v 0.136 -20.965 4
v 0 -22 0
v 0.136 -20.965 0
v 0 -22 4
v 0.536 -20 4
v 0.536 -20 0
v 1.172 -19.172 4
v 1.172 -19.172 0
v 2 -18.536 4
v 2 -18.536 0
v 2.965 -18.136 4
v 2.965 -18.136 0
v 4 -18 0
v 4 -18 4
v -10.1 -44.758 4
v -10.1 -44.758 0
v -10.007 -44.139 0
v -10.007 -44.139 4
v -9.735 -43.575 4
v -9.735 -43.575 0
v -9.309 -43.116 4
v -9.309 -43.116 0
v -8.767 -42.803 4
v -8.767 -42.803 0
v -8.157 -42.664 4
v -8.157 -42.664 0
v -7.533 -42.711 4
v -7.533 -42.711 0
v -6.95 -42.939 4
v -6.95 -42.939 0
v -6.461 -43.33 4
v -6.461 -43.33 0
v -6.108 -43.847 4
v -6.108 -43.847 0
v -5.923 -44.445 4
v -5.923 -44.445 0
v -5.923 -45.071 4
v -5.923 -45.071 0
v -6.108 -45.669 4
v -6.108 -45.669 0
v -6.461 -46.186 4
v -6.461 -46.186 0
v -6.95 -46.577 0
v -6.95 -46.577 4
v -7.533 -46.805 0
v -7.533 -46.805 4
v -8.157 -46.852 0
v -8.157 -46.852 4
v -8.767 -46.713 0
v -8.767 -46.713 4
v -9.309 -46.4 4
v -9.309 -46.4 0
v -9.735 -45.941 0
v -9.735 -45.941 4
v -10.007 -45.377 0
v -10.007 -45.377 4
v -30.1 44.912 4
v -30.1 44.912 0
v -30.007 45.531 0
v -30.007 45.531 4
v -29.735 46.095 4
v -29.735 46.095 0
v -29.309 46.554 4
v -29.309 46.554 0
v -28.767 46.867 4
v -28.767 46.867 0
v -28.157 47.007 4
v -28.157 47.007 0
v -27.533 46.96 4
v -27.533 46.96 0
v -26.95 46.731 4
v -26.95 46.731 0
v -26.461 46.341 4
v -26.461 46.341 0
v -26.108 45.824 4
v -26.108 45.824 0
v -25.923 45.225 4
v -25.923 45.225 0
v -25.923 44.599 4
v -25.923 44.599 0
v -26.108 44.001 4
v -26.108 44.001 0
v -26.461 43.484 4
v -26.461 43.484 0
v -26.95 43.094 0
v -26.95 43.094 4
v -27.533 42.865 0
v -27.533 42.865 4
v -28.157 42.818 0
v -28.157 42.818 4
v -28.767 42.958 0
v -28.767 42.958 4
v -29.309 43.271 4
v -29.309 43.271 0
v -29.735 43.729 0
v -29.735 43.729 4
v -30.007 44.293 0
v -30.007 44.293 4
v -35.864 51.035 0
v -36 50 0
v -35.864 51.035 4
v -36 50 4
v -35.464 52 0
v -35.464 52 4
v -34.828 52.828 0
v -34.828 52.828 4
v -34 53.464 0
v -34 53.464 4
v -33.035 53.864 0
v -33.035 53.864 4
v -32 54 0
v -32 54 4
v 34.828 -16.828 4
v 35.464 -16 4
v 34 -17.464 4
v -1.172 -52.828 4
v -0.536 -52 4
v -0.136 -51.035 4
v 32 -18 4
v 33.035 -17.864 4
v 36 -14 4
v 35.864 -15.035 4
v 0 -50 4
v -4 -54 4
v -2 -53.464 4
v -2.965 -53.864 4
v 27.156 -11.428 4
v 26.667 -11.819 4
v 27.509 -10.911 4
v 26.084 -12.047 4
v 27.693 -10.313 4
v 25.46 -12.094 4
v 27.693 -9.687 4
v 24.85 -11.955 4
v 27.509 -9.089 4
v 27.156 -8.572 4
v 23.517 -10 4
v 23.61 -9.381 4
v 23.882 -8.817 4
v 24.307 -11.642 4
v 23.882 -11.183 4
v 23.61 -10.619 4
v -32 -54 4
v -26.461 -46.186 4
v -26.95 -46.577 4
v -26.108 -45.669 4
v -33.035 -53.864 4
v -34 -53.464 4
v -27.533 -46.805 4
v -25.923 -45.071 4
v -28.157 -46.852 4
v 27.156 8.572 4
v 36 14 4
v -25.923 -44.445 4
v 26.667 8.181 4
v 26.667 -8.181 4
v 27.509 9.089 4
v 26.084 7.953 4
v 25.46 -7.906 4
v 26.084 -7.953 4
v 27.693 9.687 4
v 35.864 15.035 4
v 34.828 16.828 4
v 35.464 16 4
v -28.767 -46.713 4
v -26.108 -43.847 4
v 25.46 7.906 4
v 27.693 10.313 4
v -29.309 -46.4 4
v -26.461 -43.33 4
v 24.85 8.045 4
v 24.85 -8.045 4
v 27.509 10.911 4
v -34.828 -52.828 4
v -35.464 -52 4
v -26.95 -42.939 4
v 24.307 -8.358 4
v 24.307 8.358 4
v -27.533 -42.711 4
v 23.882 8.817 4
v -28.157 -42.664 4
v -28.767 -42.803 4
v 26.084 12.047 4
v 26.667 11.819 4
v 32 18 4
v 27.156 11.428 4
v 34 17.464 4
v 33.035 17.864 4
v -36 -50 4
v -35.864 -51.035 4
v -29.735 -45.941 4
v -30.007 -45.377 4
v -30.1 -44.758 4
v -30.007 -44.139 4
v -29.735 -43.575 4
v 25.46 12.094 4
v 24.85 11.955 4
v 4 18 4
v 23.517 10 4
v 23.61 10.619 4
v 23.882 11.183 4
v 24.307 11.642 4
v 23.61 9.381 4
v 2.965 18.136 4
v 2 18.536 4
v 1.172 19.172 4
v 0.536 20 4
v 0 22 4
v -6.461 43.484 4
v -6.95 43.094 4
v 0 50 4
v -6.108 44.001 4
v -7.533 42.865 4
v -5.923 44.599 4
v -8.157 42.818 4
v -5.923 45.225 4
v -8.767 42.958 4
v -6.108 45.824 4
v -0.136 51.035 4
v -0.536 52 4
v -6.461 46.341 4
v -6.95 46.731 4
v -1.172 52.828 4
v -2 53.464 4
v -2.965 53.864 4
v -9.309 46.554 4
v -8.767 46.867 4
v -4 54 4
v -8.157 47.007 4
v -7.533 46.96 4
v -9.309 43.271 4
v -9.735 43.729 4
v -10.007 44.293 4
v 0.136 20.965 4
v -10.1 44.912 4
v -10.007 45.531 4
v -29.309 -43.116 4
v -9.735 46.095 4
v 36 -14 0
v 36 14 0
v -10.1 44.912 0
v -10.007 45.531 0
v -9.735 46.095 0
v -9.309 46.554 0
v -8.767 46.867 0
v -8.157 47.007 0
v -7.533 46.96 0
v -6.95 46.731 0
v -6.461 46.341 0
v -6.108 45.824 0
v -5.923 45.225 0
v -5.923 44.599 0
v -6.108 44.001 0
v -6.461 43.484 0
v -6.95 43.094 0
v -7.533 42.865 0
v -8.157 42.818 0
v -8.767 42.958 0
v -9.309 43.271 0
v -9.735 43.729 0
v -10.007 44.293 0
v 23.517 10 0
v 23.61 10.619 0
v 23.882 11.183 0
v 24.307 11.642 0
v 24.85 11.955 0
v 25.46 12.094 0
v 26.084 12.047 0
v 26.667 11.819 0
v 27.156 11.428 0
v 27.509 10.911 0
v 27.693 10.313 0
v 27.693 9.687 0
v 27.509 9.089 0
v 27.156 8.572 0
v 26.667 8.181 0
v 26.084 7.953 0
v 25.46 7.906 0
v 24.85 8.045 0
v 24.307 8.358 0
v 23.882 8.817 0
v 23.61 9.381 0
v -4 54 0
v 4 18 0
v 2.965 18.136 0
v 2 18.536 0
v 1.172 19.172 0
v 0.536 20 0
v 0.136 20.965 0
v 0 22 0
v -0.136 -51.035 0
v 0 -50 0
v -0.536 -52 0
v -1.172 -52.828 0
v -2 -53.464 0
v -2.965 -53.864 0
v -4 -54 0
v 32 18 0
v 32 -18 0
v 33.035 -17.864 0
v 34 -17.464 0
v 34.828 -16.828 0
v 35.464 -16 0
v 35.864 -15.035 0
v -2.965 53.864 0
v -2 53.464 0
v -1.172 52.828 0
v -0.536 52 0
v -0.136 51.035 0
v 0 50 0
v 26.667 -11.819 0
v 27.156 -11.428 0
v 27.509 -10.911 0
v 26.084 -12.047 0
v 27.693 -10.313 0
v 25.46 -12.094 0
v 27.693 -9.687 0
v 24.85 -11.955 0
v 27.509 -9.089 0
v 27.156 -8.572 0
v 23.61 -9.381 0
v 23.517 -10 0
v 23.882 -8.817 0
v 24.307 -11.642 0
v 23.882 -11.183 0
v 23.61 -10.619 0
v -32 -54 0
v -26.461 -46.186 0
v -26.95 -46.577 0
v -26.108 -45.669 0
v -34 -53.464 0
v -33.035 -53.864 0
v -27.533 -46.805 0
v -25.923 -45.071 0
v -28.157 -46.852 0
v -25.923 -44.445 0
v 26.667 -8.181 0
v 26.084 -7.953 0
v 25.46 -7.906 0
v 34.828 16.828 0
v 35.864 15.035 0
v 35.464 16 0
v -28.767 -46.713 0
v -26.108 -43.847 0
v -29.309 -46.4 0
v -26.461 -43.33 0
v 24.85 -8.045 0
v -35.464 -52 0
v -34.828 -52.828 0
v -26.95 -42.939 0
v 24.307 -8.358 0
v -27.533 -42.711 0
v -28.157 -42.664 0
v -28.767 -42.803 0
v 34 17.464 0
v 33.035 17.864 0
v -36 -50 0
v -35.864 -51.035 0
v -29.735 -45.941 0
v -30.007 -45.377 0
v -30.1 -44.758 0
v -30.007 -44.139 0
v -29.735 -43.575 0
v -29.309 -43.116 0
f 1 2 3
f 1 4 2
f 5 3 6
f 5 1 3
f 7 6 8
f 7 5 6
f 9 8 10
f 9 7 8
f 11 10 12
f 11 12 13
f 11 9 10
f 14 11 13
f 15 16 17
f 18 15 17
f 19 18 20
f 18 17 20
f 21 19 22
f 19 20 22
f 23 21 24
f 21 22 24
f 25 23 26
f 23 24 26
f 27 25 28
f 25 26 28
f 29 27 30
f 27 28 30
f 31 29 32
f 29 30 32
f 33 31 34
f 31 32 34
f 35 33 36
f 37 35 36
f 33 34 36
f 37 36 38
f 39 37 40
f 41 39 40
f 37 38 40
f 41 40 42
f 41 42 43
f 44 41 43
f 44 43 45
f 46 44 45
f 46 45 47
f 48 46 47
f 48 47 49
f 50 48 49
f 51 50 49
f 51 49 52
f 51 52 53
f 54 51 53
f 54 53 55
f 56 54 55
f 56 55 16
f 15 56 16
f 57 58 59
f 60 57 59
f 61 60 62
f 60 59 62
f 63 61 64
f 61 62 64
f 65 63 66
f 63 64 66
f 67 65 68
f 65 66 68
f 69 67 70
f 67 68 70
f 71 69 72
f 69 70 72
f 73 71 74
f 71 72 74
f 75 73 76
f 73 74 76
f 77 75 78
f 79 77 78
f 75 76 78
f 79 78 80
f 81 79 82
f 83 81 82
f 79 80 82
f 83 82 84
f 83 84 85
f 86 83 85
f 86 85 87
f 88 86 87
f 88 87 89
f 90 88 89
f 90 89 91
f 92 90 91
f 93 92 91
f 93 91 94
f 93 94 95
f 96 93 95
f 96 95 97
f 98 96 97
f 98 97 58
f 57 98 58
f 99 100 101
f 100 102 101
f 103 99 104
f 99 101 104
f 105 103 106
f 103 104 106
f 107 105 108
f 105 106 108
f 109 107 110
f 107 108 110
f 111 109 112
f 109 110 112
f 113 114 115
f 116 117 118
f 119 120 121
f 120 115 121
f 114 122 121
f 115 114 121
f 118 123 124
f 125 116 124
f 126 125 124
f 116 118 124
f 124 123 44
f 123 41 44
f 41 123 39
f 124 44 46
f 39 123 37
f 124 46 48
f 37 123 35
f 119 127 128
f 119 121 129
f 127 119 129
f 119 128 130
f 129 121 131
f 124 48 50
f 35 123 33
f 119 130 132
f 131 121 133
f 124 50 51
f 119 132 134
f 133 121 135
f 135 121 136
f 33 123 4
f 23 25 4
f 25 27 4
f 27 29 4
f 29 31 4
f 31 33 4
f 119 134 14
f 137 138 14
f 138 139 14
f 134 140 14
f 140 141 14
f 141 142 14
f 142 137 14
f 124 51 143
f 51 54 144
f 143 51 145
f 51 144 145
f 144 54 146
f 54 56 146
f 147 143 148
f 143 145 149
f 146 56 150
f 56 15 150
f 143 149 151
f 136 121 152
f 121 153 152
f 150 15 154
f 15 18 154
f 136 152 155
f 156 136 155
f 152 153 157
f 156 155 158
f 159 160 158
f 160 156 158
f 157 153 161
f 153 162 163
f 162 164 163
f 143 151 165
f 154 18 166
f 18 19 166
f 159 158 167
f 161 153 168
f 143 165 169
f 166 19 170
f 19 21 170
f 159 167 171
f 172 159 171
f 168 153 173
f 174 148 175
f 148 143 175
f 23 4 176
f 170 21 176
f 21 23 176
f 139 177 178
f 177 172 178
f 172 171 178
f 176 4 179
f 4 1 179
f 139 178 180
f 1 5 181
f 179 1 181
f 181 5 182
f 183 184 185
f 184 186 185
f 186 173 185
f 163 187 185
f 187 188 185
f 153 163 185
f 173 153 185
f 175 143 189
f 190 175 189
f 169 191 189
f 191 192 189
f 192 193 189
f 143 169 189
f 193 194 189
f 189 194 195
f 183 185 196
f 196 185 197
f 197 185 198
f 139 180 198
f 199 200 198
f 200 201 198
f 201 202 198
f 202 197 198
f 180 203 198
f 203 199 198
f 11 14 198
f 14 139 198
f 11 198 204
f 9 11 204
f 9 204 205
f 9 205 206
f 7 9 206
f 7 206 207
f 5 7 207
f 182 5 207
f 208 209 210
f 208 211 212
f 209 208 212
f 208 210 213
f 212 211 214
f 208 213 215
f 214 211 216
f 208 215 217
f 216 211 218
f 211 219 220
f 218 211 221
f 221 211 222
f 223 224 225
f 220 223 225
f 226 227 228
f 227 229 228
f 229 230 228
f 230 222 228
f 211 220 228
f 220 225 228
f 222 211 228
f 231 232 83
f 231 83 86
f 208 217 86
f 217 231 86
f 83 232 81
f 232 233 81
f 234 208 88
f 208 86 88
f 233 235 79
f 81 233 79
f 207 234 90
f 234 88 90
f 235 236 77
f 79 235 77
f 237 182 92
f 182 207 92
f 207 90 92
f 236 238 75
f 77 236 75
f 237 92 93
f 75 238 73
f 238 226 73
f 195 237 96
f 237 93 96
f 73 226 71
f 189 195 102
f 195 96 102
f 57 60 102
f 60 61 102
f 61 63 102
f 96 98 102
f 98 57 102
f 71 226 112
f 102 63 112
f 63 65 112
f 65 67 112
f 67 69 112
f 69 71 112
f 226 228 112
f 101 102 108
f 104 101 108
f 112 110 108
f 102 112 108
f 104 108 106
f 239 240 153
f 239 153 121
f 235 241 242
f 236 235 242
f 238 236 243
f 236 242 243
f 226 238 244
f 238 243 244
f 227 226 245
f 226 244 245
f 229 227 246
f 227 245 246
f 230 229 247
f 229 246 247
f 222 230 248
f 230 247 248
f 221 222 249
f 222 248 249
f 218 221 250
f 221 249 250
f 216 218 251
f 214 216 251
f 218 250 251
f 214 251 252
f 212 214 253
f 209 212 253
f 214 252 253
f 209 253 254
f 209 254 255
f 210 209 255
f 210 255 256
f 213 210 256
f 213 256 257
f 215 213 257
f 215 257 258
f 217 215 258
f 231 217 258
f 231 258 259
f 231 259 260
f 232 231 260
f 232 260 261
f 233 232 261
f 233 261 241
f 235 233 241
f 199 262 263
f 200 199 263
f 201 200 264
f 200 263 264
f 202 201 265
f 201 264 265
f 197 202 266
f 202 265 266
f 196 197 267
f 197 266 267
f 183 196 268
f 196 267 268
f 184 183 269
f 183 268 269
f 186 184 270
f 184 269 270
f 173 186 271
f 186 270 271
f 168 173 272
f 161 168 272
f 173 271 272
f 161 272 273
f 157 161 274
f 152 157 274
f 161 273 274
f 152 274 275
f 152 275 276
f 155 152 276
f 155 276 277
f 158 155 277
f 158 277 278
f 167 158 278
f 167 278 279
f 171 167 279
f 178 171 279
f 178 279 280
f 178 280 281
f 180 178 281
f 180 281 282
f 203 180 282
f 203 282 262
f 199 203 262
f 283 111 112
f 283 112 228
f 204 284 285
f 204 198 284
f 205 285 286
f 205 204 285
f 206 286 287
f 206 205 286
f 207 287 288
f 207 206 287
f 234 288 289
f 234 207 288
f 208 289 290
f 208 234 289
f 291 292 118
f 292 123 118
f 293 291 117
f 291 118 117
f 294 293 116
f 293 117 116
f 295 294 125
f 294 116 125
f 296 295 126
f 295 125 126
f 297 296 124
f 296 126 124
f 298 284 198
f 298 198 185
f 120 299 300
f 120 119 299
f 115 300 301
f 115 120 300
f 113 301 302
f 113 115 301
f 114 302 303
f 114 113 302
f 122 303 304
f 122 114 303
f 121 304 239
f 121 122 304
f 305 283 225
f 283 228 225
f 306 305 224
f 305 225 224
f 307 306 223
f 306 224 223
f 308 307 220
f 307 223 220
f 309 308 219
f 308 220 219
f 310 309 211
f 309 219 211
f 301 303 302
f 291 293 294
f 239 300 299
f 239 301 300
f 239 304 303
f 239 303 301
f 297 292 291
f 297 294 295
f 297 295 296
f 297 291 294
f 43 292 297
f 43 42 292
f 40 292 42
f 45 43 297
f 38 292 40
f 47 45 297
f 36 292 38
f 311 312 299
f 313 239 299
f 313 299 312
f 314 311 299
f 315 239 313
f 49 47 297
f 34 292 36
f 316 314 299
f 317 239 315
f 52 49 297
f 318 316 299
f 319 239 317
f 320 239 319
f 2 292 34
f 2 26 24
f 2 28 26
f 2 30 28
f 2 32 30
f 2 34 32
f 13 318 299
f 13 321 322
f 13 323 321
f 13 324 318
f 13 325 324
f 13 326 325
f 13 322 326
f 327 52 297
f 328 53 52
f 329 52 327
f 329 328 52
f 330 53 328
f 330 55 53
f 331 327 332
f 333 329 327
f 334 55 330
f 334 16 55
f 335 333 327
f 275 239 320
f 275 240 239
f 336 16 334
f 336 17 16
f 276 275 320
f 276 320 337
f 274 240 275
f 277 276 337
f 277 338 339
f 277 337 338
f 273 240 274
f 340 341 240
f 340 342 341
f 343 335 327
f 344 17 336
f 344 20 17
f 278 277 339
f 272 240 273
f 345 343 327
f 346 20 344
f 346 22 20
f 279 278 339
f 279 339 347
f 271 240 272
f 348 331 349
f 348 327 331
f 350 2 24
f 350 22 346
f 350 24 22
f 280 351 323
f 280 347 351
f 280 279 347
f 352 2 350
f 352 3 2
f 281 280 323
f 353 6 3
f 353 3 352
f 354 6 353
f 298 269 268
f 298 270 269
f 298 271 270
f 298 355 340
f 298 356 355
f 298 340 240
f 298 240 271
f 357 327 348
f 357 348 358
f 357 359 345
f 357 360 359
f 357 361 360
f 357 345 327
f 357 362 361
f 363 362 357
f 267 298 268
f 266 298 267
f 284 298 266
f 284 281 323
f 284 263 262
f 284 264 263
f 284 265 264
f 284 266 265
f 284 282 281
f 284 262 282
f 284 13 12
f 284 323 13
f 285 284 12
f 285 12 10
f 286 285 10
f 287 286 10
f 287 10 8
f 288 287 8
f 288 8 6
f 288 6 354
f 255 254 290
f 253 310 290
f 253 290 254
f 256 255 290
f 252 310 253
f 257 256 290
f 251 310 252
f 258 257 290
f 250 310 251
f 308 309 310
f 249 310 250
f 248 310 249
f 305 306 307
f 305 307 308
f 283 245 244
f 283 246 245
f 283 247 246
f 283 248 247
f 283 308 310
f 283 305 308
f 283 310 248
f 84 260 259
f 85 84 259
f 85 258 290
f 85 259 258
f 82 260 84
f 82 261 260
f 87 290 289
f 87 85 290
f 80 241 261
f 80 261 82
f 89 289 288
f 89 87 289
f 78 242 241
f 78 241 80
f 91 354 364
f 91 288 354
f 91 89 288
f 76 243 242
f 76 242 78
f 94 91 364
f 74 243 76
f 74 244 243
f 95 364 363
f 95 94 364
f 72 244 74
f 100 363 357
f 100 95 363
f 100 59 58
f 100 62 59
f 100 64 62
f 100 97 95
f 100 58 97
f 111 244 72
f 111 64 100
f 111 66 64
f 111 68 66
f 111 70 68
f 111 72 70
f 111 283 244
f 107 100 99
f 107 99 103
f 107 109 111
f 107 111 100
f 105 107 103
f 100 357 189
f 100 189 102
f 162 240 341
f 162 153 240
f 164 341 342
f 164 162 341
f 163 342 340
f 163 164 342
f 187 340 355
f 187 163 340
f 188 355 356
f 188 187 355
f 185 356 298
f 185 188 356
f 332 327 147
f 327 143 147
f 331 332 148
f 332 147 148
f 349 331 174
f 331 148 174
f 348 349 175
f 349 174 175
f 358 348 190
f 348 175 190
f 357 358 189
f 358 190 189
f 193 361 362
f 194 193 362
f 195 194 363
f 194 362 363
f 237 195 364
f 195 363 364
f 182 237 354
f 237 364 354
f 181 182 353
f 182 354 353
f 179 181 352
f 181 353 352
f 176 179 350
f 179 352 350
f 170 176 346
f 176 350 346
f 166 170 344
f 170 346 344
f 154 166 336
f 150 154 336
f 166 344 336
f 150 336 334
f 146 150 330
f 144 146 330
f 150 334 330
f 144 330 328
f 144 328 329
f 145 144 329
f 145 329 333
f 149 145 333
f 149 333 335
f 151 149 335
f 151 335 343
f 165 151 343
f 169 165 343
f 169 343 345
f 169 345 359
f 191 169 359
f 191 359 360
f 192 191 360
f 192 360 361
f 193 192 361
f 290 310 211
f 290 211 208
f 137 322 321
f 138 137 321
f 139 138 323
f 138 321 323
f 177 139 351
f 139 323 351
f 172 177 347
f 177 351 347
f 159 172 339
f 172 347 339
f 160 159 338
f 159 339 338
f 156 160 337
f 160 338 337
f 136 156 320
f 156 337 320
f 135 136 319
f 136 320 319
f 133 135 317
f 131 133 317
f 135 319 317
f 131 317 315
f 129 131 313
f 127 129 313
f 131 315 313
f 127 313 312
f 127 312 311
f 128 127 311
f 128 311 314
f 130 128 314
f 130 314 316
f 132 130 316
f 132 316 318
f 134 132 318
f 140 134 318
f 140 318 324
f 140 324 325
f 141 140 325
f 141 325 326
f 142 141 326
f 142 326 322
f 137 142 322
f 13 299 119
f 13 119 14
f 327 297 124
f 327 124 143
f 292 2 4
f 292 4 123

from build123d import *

# Parameters (mm, degrees)
BOSS_EXTRUDE1_DEPTH   = 4
M5X0_8_TAPPED_HOLE1_D = 4.2
FILLET1_R             = 4


with BuildPart() as part:
    # Sketch1 → Boss-Extrude1 (new body)
    with BuildSketch(Plane.XY):
        Polygon((0, -18), (0, -54), (-36, -54), (-36, 54), (0, 54), (0, 18), (36, 18), (36, -18), align=None)
    extrude(amount=BOSS_EXTRUDE1_DEPTH)

    # M5x0.8 Tapped Hole1 (through all)
    with Locations(Plane.XY.offset(4)):
        with Locations((-28, 44.91241041), (-8, 44.91241041), (25.616827634, 10), (25.616827634, -10), (-28, -44.758024198), (-8, -44.758024198)):
            Hole(M5X0_8_TAPPED_HOLE1_D / 2)

    # Fillet1
    fillet1_edges = [part.edges().sort_by_distance(p)[0] for p in [
        (-36, 54, 2),
        (0, 54, 2),
        (0, 18, 2),
        (36, 18, 2),
        (36, -18, 2),
        (0, -18, 2),
        (0, -54, 2),
        (-36, -54, 2),
    ]]
    fillet(fillet1_edges, radius=FILLET1_R)


solid = part.part
